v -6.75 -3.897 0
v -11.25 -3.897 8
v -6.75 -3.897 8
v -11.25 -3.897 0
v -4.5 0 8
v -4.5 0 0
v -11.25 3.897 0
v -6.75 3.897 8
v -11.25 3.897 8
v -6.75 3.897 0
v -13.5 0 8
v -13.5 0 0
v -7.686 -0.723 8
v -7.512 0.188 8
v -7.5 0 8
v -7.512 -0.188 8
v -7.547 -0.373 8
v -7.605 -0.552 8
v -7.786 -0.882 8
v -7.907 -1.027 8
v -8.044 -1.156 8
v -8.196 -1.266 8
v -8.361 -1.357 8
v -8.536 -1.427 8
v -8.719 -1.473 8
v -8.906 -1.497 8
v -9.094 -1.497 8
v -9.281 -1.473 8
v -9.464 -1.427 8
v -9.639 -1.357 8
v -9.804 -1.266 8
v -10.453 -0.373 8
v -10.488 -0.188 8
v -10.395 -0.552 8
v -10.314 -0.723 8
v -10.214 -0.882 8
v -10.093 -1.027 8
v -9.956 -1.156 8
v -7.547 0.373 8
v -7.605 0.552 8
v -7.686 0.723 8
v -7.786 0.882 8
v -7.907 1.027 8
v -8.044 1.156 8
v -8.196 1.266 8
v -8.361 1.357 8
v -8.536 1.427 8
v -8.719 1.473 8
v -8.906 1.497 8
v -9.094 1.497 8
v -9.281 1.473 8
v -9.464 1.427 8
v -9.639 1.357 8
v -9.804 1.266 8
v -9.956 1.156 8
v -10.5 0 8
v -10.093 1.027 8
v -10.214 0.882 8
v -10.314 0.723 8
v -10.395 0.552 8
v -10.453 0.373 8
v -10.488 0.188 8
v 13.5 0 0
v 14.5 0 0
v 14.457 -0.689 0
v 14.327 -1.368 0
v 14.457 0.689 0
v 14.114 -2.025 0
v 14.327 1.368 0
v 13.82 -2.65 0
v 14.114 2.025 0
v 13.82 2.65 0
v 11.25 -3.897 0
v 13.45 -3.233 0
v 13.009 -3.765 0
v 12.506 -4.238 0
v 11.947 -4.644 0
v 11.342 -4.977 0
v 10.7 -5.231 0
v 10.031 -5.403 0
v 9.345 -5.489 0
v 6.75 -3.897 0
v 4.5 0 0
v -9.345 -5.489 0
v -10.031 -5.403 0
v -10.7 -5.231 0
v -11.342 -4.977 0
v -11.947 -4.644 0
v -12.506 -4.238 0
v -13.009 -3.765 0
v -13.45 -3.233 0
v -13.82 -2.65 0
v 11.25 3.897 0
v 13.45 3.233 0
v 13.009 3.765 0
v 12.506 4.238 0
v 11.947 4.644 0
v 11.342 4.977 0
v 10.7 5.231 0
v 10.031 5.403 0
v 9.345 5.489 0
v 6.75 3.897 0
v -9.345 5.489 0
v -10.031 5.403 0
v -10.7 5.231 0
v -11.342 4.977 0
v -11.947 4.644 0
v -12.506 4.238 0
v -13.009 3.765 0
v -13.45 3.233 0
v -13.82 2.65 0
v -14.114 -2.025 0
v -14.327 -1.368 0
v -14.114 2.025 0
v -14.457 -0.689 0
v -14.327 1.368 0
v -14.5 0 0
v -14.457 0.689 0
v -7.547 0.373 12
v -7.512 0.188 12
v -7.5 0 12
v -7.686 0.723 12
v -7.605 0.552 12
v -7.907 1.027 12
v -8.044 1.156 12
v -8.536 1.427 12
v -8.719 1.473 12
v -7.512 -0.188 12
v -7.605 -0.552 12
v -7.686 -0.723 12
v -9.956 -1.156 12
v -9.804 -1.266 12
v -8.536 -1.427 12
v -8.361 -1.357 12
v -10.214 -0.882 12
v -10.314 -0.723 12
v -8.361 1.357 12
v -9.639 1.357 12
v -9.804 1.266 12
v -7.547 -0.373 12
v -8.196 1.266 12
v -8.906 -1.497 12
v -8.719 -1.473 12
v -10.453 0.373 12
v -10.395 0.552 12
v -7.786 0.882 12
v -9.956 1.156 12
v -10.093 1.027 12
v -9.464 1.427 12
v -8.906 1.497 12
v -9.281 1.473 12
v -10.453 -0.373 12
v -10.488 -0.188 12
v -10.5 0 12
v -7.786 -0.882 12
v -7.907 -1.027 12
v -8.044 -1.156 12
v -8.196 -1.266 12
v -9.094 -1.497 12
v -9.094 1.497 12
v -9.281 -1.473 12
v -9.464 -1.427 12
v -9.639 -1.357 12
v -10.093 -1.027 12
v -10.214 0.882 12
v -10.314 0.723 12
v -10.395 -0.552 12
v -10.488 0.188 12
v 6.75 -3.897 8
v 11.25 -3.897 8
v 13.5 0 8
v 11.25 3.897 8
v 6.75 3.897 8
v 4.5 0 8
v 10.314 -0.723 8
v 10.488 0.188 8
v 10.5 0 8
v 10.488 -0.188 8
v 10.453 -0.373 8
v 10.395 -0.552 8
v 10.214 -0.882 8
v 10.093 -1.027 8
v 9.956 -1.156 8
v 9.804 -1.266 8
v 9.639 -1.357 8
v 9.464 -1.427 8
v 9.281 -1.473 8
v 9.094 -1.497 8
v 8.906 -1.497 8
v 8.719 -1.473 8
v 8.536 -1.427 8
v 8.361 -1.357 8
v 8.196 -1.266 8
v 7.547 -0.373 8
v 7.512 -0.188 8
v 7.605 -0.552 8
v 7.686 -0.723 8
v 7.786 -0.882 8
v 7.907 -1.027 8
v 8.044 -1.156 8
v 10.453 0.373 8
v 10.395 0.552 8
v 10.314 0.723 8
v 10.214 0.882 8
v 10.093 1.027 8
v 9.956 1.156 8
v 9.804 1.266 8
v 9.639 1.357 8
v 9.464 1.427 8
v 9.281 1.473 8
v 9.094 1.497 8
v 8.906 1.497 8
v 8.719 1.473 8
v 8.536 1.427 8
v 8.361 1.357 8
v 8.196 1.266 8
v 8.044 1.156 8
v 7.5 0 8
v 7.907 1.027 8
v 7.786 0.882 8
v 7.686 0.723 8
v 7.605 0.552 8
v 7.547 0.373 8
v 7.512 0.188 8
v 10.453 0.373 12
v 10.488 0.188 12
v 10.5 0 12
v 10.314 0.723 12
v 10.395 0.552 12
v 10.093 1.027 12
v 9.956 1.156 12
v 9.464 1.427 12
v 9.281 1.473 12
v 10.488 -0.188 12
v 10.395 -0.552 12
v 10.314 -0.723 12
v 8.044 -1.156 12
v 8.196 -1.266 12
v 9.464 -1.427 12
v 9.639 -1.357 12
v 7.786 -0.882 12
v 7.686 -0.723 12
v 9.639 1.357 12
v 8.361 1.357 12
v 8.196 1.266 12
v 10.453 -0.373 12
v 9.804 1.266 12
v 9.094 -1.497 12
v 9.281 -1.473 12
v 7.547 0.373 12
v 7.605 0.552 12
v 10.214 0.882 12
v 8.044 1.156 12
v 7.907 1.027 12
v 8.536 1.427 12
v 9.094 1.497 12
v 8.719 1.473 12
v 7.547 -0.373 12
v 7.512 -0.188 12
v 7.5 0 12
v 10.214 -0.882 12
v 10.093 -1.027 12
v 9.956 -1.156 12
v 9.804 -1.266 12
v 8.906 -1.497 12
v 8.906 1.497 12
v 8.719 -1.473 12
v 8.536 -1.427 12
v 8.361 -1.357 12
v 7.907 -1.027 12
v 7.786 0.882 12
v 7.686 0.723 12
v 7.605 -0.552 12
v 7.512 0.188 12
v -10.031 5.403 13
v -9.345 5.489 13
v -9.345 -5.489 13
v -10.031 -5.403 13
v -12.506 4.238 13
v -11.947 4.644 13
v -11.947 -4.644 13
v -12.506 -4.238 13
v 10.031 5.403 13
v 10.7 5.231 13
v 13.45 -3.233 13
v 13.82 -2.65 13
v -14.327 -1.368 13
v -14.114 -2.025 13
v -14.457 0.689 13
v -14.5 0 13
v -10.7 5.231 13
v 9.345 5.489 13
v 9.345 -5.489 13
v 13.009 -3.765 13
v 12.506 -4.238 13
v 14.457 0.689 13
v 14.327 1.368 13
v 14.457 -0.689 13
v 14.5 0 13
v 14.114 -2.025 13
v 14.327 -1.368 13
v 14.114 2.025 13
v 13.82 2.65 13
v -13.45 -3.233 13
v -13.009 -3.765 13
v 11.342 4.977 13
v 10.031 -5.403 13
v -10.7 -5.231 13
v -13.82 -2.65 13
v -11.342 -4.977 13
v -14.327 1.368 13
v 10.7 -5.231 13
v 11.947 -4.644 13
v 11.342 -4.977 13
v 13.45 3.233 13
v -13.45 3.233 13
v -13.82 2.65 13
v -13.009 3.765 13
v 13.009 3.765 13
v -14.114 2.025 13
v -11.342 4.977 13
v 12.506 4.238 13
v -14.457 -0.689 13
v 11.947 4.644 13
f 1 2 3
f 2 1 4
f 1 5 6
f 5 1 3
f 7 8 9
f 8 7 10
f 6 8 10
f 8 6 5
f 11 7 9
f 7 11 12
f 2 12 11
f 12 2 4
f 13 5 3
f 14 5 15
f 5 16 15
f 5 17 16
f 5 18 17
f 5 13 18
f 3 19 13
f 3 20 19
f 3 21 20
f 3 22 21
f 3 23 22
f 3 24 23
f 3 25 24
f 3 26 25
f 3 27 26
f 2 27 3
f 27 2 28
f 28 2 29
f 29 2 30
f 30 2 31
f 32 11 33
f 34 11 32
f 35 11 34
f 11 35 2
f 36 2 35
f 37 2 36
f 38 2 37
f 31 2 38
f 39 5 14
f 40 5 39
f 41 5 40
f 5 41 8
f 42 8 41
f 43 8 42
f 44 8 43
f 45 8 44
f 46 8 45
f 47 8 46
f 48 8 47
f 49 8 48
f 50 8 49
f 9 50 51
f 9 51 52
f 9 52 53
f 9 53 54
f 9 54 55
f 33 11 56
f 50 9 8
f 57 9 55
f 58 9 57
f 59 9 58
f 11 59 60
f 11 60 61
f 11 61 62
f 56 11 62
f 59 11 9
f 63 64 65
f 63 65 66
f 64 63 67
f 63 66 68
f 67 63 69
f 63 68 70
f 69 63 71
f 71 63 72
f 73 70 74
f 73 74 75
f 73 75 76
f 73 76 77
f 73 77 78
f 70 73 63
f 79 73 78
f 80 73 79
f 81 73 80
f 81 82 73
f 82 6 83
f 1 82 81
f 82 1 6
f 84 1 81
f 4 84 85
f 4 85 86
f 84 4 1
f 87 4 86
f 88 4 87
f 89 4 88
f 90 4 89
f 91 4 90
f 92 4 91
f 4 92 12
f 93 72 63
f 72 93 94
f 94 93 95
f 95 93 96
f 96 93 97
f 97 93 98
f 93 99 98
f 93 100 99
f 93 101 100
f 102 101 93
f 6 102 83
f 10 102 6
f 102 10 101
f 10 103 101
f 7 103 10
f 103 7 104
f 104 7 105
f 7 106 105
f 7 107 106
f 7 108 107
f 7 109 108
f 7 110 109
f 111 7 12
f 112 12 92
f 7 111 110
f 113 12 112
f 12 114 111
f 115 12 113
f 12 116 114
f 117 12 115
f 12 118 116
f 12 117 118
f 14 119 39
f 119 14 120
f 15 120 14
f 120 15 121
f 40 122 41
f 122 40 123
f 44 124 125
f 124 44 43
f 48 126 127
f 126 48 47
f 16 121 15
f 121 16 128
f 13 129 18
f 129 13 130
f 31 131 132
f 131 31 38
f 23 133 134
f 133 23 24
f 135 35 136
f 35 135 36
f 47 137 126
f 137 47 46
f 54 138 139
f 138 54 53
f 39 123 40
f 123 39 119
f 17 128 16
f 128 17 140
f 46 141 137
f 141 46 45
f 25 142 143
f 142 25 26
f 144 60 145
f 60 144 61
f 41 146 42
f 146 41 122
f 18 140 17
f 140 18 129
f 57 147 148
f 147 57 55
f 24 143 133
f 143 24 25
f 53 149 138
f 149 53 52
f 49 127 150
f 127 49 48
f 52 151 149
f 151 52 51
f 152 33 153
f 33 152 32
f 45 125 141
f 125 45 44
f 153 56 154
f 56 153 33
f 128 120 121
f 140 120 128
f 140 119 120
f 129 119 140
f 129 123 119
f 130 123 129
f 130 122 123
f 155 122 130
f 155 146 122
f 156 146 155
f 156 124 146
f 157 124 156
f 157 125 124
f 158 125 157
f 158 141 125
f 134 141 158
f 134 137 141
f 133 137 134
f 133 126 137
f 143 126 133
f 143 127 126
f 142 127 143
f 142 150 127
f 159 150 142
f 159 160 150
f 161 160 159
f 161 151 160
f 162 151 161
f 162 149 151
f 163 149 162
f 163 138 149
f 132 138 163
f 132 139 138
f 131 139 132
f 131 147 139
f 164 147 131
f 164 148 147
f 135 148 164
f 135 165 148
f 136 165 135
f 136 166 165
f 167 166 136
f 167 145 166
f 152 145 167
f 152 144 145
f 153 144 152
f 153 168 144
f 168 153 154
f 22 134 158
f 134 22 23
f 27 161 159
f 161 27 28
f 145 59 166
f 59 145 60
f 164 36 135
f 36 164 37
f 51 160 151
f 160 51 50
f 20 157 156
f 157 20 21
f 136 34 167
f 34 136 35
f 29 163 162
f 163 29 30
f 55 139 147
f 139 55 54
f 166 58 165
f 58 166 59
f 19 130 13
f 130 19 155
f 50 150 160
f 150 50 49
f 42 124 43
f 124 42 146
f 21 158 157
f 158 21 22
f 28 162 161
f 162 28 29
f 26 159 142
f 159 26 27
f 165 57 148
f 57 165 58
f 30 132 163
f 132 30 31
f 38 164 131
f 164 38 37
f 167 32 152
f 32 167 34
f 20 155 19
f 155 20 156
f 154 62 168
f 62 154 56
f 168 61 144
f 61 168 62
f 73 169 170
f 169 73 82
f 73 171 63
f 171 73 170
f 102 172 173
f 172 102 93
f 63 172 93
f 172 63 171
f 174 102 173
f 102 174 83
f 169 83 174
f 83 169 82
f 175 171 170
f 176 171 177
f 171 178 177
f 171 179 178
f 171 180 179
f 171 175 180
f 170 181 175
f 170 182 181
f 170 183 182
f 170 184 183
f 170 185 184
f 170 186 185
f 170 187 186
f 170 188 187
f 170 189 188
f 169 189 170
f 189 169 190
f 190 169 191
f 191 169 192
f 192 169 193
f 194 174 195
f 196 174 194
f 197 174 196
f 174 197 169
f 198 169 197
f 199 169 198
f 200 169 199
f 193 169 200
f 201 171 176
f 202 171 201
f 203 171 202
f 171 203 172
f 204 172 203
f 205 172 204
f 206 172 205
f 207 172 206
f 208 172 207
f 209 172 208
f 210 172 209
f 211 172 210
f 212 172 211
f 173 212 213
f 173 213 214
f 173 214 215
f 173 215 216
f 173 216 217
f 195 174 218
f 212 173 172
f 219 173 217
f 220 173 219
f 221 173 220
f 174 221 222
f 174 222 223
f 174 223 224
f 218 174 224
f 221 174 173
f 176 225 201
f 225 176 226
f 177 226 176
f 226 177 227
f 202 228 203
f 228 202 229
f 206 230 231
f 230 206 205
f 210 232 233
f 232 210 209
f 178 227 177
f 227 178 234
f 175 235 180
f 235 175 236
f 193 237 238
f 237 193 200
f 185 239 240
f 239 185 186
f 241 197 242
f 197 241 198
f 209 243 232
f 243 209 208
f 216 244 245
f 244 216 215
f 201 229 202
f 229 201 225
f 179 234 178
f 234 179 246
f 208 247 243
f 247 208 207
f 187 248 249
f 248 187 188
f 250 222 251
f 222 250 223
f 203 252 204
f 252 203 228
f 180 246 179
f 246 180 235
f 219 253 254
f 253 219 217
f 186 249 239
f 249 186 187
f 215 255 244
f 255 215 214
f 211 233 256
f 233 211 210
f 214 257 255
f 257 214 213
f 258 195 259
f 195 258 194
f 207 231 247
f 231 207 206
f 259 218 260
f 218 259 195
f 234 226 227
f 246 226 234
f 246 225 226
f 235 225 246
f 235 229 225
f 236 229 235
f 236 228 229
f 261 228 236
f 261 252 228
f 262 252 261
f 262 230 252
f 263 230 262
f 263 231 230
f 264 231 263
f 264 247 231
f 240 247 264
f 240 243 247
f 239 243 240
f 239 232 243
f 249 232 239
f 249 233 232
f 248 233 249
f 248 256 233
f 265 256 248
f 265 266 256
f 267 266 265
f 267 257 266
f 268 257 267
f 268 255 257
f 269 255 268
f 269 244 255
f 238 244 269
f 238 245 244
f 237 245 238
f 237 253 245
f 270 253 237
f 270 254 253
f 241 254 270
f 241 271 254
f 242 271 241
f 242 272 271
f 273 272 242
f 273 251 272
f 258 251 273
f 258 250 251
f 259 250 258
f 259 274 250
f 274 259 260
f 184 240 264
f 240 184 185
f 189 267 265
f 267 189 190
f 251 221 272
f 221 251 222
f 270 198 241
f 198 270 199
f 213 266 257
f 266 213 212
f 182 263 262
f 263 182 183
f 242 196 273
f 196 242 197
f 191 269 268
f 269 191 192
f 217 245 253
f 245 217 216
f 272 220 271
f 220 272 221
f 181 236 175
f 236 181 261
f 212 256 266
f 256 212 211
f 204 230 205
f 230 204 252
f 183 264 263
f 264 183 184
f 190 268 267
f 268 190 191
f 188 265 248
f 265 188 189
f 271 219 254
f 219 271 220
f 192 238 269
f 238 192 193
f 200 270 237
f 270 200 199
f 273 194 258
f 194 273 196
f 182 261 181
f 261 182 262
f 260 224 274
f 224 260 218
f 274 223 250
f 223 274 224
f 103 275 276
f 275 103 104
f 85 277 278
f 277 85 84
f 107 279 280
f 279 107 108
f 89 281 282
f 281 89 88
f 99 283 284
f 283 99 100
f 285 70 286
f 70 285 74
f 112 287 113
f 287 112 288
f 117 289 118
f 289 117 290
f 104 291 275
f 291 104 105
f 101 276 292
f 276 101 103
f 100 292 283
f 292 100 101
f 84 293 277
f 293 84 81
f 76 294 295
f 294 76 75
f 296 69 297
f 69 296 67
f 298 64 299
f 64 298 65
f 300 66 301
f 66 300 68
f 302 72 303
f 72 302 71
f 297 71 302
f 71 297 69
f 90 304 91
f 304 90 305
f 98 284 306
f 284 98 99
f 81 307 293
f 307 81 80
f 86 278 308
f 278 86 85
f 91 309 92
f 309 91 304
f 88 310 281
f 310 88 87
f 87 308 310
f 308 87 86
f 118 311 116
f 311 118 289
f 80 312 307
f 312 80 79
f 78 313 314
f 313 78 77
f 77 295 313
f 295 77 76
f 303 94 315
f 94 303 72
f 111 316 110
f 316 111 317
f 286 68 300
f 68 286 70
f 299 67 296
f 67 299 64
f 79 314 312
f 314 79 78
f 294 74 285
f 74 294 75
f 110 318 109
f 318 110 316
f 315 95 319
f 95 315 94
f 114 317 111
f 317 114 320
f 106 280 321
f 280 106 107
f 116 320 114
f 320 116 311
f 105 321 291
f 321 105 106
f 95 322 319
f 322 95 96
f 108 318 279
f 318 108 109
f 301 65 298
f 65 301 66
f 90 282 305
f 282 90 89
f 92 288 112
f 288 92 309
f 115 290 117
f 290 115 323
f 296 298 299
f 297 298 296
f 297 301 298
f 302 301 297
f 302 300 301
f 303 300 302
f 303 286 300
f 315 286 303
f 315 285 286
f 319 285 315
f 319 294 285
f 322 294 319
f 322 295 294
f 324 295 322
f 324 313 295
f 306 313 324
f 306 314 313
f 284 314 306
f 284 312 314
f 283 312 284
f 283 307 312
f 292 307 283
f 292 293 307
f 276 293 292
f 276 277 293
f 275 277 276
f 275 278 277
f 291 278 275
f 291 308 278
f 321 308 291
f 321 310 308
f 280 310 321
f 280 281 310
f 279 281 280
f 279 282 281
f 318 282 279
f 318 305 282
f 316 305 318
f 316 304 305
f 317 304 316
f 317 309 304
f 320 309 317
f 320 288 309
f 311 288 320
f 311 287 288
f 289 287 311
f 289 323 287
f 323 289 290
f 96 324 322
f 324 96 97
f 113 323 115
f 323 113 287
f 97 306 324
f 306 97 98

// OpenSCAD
NUB_DIA = 3;
NUB_LENGTH = 4;
HEX_DIA = 9;
HEX_LENGTH = 8;

DIA = 11;
HEIGHT = 13;

SPACING = 18;

$fn = 50;

module inside() {
  cylinder(d = HEX_DIA, h = HEX_LENGTH, $fn = 6);
  translate([0, 0, HEX_LENGTH])
  cylinder(d = NUB_DIA, h = NUB_LENGTH);
}

module isolator() {
  difference() {
    hull() {
      translate([-SPACING/2, 0, 0])
      cylinder(d = DIA, h = HEIGHT);
      translate([SPACING/2, 0, 0])
      cylinder(d = DIA, h = HEIGHT);
    }
    #translate([-SPACING/2, 0, 0])
    inside();

    #translate([SPACING/2, 0, 0])
    inside();
  }
}

isolator();
